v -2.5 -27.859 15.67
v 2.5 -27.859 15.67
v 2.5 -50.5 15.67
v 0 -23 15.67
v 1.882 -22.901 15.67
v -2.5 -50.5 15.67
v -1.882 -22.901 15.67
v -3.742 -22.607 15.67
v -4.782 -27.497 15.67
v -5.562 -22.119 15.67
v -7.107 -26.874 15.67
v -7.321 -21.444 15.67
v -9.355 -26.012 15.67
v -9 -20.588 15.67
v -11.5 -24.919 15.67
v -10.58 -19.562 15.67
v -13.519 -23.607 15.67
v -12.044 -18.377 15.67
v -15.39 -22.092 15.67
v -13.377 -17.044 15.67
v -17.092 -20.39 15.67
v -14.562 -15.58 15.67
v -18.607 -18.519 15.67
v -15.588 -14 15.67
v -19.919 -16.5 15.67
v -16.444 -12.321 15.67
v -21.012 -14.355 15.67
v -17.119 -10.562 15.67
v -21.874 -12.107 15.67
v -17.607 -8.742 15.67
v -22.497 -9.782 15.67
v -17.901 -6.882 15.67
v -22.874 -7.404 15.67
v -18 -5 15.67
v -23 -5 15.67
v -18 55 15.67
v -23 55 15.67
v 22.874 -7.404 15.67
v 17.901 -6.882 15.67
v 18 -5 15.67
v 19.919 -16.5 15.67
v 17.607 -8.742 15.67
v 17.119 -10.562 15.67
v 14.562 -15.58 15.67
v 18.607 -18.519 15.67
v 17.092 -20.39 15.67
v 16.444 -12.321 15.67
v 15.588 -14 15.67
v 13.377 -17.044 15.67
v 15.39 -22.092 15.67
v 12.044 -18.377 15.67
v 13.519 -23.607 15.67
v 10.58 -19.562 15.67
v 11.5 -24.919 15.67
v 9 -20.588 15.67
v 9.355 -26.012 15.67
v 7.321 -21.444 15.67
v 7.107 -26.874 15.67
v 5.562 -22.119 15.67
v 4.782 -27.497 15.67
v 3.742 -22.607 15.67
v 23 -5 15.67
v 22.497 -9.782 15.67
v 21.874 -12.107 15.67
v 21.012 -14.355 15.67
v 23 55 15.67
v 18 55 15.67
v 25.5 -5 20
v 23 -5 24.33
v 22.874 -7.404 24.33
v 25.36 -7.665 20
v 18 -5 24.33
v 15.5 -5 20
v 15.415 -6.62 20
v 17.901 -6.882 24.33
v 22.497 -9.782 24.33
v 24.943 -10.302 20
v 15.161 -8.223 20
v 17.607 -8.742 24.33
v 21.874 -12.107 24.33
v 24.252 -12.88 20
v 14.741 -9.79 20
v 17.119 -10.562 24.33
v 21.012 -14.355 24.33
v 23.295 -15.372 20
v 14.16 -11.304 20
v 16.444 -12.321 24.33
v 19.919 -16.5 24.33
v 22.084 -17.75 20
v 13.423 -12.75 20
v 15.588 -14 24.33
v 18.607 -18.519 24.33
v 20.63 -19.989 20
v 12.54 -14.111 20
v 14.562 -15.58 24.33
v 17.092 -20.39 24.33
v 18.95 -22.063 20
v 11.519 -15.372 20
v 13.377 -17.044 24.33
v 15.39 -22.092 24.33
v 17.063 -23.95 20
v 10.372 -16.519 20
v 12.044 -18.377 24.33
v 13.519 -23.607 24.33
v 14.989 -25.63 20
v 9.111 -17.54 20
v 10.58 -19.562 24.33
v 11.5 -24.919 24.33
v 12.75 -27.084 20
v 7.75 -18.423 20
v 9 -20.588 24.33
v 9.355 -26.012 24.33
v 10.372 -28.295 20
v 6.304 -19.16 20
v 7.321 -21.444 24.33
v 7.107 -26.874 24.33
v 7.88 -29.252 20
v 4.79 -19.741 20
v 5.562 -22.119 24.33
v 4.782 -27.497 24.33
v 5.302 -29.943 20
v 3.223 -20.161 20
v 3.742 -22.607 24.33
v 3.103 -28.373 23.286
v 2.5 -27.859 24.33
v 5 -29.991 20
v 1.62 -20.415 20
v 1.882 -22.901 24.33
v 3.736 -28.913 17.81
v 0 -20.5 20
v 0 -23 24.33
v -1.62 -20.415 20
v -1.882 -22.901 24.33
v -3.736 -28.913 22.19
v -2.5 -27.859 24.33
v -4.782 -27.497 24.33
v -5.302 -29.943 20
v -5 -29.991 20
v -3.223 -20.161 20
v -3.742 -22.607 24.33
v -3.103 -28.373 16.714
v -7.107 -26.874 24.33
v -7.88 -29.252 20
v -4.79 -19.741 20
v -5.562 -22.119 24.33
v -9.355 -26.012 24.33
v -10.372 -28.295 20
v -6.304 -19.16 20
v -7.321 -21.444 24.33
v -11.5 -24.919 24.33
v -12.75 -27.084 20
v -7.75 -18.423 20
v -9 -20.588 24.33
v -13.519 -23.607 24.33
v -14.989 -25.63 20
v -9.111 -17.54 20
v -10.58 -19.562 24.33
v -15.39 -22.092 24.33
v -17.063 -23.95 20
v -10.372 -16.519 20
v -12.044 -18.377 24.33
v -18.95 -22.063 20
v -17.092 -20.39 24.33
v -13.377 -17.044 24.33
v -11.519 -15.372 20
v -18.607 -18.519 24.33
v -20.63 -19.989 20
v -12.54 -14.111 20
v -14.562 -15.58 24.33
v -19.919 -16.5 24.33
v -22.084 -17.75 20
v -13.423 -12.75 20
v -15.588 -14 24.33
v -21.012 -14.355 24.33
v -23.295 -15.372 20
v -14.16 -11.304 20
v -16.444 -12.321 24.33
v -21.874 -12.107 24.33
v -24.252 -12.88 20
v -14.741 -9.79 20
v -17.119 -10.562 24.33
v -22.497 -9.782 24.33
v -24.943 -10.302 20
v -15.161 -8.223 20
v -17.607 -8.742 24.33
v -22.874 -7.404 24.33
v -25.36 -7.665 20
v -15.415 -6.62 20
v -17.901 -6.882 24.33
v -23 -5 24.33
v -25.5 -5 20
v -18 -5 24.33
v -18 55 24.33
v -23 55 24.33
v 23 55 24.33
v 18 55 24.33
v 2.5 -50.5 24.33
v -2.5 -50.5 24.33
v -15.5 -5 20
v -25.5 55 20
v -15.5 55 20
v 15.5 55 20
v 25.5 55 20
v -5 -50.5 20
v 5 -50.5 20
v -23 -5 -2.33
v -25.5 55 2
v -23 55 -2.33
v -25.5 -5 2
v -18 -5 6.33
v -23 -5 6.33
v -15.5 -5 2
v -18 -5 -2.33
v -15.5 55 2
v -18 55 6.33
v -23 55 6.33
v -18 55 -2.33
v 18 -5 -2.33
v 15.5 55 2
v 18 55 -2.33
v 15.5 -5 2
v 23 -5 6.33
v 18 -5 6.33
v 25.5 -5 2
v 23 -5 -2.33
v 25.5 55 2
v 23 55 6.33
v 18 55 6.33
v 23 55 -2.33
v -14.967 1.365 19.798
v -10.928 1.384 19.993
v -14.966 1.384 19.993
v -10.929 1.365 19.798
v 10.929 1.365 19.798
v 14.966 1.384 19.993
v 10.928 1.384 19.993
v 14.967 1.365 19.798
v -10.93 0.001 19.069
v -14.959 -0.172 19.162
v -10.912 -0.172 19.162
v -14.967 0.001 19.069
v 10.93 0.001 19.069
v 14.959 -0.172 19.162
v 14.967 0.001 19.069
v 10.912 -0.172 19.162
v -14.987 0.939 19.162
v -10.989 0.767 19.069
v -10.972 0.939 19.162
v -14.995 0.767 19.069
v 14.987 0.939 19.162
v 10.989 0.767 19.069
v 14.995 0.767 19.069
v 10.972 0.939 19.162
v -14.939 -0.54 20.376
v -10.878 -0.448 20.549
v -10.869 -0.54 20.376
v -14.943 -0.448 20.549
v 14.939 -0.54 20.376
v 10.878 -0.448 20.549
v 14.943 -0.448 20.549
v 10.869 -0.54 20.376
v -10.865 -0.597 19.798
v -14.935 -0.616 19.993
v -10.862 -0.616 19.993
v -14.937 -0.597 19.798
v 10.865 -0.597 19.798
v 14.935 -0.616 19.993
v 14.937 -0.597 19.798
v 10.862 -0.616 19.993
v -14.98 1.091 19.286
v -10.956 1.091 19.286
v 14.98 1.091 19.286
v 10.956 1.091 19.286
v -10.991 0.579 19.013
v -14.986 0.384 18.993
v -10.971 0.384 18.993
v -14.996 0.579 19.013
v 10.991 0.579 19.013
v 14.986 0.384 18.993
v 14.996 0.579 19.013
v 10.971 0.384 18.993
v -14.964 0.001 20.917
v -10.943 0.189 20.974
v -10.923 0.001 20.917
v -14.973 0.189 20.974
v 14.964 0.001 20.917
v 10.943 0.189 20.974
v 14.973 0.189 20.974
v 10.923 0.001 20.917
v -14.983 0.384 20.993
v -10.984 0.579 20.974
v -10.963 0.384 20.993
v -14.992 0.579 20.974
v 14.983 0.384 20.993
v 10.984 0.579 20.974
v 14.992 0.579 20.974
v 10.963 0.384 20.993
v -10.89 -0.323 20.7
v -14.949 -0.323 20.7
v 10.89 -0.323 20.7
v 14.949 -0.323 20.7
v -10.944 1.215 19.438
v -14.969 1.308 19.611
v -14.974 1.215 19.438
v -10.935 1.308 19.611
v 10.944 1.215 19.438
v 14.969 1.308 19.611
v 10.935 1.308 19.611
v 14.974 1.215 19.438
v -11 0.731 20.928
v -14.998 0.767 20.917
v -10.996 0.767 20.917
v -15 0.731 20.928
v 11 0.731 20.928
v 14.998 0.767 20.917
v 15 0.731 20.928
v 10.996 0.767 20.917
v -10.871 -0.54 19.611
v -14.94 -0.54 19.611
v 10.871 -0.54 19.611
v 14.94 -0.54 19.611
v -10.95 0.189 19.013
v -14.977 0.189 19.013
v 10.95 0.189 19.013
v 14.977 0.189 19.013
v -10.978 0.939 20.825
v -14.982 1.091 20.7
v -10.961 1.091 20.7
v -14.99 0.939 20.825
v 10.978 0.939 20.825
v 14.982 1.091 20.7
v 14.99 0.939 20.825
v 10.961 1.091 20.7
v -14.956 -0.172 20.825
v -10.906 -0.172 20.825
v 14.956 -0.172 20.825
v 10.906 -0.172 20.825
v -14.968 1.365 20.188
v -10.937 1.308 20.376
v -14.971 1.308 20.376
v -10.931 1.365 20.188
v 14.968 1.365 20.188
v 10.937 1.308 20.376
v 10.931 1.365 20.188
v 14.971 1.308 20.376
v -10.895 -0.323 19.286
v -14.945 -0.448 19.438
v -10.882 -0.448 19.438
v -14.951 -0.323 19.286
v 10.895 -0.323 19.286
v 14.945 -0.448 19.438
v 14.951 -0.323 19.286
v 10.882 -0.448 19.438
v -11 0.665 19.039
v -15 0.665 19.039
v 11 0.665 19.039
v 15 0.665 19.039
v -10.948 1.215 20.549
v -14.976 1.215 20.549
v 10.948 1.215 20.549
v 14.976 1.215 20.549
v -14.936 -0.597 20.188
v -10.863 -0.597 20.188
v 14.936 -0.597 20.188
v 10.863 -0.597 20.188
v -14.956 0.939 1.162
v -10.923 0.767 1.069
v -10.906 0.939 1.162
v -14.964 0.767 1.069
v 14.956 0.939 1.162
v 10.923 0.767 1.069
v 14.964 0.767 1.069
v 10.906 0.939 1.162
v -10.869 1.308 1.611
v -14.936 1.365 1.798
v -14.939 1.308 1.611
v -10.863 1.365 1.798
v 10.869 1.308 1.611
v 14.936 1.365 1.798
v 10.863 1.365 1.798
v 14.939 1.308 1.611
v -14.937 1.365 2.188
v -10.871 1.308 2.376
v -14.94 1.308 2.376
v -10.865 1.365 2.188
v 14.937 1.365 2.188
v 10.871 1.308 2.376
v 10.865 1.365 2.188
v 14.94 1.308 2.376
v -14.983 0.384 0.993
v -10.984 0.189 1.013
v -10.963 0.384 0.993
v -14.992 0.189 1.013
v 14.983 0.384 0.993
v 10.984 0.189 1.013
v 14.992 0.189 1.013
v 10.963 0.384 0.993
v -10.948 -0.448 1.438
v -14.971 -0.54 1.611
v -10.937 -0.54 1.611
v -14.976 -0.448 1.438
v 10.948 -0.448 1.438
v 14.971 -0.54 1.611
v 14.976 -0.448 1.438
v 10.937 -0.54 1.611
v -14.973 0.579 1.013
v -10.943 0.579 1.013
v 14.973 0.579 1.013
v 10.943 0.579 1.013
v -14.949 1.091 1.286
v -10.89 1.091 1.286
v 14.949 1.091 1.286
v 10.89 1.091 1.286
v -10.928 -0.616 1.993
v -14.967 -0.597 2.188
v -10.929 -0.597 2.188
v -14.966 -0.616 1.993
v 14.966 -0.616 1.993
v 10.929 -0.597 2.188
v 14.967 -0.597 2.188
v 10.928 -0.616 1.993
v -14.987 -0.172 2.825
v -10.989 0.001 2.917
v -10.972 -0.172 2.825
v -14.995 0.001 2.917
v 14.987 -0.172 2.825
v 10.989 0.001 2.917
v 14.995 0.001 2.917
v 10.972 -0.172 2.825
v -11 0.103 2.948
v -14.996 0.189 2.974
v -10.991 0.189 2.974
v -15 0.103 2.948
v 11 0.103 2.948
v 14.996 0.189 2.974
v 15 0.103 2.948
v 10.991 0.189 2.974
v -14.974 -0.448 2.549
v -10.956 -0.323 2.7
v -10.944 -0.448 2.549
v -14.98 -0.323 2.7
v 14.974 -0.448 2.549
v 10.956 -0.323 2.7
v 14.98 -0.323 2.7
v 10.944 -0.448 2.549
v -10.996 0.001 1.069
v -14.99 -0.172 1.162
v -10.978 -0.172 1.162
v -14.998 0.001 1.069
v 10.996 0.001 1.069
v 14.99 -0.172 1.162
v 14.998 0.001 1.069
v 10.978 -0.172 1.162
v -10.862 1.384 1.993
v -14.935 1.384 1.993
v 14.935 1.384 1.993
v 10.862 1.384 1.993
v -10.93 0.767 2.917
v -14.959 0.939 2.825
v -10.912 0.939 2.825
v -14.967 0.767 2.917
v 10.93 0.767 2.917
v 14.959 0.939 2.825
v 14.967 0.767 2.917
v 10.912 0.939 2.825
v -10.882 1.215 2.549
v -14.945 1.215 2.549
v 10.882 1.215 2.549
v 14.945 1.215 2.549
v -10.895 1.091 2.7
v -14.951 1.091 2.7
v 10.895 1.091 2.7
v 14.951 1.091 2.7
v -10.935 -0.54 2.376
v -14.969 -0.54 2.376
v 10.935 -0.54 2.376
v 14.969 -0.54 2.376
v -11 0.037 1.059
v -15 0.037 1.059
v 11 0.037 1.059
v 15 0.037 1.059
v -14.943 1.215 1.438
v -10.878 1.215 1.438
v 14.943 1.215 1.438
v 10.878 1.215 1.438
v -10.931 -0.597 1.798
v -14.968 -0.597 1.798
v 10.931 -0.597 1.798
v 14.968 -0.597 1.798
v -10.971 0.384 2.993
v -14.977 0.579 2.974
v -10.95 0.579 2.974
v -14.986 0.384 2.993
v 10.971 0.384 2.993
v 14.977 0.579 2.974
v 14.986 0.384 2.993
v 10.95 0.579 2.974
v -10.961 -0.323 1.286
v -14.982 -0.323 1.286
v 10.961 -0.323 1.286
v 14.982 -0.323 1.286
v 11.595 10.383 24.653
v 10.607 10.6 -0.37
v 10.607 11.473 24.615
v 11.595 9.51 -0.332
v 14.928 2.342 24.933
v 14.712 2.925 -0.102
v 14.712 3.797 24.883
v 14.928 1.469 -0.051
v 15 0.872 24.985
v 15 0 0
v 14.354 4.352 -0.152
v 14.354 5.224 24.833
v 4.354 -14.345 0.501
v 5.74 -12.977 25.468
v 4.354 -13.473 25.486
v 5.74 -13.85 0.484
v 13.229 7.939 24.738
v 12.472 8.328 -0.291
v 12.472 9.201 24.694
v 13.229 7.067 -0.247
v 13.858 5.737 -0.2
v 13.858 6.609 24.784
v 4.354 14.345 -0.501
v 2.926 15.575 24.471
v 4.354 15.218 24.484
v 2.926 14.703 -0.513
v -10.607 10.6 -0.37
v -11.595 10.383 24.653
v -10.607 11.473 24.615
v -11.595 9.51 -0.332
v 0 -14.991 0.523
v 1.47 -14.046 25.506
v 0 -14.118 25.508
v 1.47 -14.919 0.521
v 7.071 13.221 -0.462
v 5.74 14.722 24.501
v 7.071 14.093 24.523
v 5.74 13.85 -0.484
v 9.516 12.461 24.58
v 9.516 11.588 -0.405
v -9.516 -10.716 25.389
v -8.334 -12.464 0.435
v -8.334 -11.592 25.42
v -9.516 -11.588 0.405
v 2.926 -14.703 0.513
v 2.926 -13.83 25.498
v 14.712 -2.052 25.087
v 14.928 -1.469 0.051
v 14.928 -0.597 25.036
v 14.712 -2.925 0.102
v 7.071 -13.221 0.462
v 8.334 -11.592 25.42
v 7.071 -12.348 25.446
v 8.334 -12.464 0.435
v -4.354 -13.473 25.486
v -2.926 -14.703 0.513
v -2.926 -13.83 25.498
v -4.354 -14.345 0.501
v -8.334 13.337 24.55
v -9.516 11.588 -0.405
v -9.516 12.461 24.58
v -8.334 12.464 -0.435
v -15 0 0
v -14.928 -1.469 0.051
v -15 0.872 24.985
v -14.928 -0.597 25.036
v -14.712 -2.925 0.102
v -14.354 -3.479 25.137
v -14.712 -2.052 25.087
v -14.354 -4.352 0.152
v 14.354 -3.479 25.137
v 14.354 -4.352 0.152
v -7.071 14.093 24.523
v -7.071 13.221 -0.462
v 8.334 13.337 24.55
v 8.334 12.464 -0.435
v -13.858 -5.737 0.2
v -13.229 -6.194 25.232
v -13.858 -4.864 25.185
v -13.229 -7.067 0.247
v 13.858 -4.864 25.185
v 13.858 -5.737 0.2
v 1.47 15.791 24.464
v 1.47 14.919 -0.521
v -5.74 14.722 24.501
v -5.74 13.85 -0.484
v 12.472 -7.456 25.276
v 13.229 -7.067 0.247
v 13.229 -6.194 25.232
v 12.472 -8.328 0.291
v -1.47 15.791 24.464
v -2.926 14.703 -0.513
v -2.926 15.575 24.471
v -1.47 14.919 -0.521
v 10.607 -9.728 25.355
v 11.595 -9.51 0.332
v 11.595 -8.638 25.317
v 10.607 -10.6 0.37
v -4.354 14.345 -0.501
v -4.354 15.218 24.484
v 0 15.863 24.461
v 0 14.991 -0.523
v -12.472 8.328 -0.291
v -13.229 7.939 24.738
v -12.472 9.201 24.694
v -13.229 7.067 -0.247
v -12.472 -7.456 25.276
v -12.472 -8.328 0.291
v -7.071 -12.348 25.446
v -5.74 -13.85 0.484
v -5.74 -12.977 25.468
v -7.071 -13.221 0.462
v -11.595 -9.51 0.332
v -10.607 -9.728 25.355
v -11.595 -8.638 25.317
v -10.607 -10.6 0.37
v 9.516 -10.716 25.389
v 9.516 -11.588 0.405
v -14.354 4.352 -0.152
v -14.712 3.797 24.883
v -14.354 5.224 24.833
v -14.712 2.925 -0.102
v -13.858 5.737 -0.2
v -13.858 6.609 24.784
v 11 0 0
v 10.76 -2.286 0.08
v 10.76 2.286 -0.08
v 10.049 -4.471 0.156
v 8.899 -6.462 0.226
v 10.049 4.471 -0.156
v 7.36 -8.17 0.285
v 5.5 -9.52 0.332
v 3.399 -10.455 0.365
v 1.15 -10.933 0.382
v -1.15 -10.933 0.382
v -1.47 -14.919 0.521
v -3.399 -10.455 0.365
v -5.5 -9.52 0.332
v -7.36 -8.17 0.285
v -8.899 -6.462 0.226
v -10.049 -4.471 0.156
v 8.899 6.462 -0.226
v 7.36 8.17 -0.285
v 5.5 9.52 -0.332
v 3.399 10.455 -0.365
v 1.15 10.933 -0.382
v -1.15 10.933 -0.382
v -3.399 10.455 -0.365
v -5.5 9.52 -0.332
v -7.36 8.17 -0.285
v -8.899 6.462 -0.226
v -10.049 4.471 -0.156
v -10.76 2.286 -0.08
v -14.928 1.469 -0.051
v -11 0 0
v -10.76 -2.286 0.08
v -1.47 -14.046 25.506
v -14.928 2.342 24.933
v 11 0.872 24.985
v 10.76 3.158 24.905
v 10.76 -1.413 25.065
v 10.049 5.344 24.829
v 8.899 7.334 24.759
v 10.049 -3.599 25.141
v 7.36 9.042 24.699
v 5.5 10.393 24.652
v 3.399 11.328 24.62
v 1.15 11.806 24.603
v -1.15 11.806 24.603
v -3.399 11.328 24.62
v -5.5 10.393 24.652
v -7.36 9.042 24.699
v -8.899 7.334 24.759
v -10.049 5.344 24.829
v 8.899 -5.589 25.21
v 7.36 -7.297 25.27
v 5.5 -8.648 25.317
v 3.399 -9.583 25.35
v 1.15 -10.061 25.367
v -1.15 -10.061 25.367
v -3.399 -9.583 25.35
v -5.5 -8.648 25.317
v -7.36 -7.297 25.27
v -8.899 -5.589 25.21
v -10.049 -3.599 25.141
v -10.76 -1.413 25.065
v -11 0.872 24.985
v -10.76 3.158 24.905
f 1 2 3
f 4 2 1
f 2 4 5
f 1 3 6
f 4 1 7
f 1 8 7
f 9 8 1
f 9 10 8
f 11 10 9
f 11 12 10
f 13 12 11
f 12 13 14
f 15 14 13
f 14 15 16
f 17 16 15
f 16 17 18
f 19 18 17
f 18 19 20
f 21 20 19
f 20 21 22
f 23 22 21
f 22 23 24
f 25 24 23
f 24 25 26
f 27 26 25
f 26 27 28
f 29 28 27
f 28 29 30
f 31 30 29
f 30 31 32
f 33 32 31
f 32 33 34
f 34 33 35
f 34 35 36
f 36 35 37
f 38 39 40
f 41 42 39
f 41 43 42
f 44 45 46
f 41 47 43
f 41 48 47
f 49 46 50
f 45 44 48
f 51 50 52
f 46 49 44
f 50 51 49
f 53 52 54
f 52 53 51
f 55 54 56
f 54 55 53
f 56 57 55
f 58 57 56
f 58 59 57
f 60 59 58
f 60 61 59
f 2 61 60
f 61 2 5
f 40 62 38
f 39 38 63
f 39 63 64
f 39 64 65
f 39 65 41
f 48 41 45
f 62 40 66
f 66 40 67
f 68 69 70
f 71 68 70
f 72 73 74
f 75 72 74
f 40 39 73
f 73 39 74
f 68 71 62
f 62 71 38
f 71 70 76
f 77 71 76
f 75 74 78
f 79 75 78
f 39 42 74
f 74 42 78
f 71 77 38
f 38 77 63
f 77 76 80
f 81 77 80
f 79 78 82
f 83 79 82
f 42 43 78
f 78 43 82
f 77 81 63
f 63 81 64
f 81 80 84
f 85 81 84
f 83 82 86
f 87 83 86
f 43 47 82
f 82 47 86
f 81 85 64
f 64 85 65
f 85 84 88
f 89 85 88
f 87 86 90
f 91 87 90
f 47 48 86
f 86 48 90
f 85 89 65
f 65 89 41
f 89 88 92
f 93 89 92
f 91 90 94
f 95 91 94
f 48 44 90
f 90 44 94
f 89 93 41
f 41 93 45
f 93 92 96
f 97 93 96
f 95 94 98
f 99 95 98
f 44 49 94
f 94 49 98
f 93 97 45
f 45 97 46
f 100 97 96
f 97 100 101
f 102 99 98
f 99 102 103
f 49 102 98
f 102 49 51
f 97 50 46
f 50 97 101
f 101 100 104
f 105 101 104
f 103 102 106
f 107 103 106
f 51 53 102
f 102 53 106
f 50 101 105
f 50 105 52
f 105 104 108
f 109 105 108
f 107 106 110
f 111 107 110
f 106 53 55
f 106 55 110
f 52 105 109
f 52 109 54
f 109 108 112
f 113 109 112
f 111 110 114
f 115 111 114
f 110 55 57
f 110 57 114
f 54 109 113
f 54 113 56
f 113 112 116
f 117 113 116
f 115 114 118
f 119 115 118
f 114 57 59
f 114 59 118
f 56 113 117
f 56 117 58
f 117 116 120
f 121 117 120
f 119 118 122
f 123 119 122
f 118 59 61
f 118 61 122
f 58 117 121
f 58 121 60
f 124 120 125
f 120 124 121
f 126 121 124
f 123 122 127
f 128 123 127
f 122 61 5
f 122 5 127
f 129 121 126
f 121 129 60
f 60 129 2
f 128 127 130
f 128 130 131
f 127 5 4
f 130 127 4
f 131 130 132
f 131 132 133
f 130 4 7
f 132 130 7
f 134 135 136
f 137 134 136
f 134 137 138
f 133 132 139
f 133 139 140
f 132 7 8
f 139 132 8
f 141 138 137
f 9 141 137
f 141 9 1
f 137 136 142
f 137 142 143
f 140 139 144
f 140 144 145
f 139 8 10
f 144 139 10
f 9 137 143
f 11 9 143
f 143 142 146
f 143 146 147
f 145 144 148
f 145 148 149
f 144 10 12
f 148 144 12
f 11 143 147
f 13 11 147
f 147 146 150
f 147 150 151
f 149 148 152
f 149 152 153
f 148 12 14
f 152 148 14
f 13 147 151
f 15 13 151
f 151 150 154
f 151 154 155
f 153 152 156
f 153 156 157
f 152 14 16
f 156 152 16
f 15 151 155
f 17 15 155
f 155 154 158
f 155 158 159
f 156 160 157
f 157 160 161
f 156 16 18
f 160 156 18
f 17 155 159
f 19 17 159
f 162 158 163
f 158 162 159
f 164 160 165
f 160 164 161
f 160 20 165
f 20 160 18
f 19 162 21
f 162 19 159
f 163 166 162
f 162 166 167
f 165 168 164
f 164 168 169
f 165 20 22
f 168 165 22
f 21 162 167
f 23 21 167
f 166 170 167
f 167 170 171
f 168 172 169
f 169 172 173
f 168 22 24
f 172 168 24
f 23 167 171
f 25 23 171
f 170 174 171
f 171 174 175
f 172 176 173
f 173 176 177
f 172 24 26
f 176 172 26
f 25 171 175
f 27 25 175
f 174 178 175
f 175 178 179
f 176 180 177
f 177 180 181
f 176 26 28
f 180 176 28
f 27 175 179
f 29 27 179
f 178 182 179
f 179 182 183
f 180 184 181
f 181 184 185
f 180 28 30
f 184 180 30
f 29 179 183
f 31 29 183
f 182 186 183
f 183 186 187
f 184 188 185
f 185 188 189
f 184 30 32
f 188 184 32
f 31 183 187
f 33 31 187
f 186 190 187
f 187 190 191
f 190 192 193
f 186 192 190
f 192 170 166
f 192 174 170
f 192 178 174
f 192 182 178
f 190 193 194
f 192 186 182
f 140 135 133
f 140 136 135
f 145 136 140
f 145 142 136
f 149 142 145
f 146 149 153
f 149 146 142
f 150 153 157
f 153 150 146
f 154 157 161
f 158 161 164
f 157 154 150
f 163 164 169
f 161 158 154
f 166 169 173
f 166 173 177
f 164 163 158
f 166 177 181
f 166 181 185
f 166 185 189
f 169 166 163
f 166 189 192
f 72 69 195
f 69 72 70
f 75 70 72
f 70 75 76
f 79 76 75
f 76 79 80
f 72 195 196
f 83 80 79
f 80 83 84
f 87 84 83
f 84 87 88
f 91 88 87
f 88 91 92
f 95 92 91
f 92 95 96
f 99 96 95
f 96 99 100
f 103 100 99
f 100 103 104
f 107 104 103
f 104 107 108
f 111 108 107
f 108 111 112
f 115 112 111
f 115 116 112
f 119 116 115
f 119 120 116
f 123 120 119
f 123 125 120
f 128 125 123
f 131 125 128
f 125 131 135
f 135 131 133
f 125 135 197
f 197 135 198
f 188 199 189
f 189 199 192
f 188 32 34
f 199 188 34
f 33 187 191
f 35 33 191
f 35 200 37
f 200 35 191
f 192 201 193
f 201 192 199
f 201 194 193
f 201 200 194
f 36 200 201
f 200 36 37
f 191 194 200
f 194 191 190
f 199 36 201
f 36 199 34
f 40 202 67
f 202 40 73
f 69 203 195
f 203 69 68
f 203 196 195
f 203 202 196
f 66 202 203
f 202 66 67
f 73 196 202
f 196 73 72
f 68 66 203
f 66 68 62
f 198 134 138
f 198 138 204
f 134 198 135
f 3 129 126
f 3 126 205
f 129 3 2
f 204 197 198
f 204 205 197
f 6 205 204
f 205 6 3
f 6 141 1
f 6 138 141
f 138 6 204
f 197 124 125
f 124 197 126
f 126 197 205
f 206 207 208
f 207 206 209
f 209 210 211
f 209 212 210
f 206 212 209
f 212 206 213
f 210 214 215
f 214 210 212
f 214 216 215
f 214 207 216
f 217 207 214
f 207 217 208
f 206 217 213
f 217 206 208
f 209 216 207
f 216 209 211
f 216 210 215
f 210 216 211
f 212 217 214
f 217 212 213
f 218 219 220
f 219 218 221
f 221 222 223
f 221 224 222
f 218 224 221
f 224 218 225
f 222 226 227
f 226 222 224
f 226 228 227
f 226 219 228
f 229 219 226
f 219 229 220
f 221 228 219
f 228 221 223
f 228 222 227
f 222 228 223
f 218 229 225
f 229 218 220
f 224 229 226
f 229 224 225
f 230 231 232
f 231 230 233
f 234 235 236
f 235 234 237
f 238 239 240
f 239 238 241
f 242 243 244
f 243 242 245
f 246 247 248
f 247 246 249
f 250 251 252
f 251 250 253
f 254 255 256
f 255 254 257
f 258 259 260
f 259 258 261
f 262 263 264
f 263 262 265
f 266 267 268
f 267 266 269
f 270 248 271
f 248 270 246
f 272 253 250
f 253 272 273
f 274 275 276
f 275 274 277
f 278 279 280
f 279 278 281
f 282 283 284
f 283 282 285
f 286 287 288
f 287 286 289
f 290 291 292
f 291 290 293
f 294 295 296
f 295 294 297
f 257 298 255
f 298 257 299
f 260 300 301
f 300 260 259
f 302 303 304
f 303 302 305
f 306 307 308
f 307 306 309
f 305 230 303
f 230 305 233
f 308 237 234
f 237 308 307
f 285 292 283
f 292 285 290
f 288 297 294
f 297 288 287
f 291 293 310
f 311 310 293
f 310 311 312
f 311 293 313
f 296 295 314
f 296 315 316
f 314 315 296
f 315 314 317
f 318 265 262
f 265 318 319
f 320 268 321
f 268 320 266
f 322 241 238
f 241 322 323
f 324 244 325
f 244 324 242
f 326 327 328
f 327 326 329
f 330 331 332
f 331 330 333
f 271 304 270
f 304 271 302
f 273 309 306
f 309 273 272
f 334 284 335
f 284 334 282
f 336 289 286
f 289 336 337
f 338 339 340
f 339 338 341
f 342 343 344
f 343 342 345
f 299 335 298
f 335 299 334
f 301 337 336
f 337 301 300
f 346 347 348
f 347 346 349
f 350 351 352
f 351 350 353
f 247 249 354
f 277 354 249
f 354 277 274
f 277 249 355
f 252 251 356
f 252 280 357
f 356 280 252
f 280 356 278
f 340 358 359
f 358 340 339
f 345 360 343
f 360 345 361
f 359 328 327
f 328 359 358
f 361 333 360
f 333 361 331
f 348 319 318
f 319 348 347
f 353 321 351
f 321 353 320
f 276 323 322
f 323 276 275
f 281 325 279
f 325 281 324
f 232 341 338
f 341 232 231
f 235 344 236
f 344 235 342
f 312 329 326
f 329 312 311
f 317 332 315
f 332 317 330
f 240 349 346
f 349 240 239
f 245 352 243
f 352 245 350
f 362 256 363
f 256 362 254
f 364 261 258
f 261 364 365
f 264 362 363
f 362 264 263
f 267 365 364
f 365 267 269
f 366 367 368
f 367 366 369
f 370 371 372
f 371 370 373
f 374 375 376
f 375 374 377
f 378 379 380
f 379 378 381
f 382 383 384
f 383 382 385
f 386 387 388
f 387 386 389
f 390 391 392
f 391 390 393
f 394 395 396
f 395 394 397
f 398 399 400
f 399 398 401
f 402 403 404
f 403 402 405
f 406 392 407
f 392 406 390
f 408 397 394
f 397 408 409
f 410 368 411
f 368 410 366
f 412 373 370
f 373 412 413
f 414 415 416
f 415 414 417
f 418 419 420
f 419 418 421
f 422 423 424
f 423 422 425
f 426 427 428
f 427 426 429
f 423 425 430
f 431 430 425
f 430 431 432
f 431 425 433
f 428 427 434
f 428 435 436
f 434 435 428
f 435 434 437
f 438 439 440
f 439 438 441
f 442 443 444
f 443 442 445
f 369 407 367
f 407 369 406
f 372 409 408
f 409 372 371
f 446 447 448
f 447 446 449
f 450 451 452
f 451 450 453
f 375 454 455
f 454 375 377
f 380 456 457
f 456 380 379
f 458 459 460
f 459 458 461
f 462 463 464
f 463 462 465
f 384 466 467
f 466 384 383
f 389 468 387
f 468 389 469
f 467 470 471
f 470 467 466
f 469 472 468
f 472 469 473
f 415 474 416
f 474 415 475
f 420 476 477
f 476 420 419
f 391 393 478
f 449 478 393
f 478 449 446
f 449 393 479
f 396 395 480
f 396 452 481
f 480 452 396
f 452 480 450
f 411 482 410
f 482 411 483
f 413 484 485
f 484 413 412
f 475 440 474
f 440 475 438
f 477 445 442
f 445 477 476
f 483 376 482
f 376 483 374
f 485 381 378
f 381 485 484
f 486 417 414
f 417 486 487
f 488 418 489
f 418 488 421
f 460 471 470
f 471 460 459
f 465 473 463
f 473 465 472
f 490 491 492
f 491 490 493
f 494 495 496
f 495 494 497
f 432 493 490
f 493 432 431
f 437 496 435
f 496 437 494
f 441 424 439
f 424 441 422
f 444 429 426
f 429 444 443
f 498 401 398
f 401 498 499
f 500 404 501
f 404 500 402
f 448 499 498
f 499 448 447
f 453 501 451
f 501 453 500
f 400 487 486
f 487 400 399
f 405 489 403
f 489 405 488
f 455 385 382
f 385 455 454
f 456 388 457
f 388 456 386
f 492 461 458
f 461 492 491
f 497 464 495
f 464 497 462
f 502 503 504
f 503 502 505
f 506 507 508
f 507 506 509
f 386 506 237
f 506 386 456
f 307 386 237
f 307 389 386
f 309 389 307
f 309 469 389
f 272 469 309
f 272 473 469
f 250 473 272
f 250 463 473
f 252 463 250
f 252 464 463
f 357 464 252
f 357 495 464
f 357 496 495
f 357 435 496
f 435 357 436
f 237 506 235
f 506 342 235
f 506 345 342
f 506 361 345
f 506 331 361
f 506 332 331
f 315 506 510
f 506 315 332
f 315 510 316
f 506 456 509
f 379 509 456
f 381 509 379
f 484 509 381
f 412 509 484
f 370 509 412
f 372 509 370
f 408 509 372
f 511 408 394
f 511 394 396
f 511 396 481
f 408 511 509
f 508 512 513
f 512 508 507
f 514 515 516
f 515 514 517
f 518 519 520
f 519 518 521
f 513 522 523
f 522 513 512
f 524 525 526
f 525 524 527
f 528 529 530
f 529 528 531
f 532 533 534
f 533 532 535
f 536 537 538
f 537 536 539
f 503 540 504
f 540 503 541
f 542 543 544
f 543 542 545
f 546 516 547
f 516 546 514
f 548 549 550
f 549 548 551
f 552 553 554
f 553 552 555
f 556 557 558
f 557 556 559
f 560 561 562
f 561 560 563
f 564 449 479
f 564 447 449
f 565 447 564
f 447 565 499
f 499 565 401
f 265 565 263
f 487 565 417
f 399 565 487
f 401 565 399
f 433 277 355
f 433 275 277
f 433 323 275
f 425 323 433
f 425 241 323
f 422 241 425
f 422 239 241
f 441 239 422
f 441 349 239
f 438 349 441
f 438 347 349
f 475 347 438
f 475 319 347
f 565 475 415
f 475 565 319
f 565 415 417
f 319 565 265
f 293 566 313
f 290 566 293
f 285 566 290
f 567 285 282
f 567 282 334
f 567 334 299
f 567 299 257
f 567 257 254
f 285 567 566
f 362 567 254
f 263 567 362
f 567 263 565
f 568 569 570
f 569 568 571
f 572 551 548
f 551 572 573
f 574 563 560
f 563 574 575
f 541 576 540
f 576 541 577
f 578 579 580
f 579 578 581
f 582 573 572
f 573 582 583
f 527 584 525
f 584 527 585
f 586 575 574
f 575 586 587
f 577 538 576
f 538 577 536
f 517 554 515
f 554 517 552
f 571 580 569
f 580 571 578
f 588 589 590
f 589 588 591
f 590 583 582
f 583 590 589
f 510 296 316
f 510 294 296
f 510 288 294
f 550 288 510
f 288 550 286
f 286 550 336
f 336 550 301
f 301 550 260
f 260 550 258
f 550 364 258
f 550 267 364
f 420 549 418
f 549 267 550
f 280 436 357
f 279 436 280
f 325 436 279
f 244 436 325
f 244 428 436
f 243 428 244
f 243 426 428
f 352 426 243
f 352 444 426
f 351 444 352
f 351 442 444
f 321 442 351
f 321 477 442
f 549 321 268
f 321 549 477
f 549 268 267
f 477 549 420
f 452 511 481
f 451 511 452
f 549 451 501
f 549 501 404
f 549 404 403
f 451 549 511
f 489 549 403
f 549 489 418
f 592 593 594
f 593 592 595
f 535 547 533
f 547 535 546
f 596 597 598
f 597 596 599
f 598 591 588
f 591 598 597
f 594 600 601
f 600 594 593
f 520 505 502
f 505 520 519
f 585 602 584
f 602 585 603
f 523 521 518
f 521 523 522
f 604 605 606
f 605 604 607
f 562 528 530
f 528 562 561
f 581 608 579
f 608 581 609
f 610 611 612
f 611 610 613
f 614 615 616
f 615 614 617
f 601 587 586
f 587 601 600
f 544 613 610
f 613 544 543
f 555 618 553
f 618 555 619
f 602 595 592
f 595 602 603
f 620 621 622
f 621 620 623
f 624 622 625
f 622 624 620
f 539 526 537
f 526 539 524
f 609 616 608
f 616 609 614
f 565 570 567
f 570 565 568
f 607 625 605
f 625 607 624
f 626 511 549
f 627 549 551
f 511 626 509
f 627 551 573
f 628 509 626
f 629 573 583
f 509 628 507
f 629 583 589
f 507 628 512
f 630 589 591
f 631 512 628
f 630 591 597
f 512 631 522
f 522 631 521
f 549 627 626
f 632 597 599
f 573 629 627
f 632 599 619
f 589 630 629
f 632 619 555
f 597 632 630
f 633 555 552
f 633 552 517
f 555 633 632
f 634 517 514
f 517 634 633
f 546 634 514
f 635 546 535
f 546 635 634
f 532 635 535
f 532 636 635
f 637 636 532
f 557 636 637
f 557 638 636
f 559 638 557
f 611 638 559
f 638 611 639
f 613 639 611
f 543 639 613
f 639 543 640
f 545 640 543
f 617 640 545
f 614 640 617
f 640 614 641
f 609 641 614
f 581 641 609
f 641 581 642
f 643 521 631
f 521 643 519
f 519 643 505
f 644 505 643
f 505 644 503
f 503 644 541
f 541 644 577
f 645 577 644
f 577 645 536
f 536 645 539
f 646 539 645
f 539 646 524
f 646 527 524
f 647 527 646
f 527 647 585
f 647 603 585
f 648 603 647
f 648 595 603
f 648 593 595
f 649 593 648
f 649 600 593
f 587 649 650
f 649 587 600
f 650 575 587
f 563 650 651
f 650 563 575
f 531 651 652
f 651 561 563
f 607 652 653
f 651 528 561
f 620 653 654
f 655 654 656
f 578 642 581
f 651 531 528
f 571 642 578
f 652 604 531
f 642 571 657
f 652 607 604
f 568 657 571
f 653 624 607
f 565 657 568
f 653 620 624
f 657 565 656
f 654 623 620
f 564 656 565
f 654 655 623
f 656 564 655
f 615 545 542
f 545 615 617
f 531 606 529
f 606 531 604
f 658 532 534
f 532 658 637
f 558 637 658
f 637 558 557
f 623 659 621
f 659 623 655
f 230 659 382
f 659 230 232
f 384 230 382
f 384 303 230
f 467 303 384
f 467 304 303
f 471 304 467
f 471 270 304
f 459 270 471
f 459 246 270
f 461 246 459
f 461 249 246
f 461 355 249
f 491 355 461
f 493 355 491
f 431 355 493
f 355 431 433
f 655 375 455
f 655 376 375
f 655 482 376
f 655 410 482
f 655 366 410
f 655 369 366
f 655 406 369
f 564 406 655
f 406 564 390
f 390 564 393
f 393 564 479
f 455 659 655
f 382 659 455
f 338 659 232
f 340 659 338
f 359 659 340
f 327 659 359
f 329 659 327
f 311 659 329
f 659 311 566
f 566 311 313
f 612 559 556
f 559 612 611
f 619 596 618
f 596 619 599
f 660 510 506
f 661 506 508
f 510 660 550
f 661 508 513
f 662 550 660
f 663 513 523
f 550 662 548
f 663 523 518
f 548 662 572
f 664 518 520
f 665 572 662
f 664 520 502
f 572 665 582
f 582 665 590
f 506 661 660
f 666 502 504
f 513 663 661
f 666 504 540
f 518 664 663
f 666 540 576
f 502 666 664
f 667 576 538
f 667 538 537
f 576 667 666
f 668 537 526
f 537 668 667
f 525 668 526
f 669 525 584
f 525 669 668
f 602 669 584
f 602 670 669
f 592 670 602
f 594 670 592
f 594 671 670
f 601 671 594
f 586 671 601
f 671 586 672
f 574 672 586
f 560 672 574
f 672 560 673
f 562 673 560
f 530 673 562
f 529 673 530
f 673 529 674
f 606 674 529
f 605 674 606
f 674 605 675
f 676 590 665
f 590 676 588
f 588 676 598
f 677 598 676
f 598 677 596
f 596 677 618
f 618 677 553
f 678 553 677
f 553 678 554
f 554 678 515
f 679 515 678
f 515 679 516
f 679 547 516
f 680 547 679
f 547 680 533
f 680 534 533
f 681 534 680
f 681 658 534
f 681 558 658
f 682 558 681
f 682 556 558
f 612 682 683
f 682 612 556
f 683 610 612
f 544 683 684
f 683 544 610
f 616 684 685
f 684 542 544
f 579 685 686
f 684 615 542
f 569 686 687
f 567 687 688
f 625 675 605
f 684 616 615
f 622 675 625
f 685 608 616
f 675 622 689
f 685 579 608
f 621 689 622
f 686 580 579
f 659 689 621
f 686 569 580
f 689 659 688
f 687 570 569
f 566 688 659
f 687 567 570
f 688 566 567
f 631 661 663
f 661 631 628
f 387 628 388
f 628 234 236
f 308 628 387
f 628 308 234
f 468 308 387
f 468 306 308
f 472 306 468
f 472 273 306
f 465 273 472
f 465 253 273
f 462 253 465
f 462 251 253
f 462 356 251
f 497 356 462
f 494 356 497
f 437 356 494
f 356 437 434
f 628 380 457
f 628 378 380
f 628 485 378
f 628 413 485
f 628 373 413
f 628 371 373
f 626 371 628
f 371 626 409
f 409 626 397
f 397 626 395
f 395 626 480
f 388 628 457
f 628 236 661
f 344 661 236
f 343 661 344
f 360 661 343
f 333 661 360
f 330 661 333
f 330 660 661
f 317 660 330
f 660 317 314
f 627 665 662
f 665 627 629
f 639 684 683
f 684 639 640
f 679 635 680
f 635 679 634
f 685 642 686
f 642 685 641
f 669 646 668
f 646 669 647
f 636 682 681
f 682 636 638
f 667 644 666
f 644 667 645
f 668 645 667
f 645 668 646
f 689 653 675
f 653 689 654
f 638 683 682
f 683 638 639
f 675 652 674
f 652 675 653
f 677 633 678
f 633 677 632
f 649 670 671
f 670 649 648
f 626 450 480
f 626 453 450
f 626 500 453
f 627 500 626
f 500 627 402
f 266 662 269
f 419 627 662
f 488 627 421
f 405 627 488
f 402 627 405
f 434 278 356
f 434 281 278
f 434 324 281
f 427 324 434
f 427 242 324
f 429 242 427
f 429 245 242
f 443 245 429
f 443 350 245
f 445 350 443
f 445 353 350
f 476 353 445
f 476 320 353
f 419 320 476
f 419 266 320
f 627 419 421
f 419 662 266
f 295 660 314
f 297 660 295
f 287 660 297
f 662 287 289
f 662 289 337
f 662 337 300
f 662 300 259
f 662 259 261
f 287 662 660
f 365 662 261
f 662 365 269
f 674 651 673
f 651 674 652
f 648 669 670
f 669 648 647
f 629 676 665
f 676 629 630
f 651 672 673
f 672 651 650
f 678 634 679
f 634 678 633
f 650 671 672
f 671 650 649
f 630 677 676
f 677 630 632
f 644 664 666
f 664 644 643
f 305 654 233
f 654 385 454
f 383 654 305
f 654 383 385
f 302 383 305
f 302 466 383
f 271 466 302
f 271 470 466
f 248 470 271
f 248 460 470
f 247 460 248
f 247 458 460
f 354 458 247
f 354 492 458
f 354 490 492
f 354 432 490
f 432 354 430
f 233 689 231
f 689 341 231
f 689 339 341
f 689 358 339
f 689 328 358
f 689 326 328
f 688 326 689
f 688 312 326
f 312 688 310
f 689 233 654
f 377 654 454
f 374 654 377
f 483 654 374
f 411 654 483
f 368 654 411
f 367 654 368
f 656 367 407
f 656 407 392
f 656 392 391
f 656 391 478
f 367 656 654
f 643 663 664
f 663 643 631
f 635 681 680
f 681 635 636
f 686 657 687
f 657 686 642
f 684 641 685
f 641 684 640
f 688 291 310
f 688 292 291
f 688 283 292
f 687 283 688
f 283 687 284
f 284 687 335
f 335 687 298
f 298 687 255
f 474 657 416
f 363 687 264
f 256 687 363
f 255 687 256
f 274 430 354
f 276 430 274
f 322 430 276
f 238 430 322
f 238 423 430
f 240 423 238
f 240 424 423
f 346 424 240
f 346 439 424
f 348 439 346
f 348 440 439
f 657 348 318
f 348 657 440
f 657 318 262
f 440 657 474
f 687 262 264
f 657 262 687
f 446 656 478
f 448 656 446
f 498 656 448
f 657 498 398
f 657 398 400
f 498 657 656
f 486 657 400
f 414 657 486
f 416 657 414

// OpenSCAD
// file: leverMounting.scad
use <presser.scad>
use <leverArms.scad>

mountingDistance = 18;
mountingBottomHoleCenter = 2;
function mountingHoles_getBottomPosition() = [0,0,mountingBottomHoleCenter];
function mountingHoles_getTopPosition() = [0,0,mountingBottomHoleCenter + mountingDistance];
presserR = presser_getR();
holeR = 1;


module mountingHoles(ang = 0)
{
    translate([0,0,mountingDistance/2 + mountingBottomHoleCenter]) rotate([ang,0,0])    union()
    {
        #translate([-presserR - 15, 0, mountingDistance / 2]) rotate([0, 90, 0]) cylinder(h = 2 * presserR + 30, r = holeR, $fn =32);
        #translate([-presserR - 15, 0, -mountingDistance / 2]) rotate([0, 90, 0]) cylinder(h = 2 * presserR + 30, r = holeR, $fn =32);
    }
    
}
mountingHoles();
// file: presser.scad
use <leverMounting.scad>


radious = 15;
thickness = 4;
height = 25;

function presser_getR() = radious;
function getPresserAng() = 2;

presser();
module presser()
{
    difference()
    {
        cylinder(h = height, r = radious, $fn =64);
        translate([0,0,-1])cylinder(h = height + 2, r = radious - thickness);
        
        mountingHoles(getPresserAng());
    }
    
}
// file: leverArms.scad
use <presser.scad>

armsLen = 60;
distanceR = presser_getR() + 0.5;
profileR = 5;

function leverArms_getProfileR() =  profileR;
function leverArms_getDistanceR() = distanceR;



module leverArms_profile()
{
    circle(r = profileR, $fn = 6);
}

module leverArms()
{
    union()
    {
        translate([-(distanceR + profileR), 0, 0]) rotate([-90,0,0])  linear_extrude(    armsLen) leverArms_profile();
        translate([+(distanceR + profileR), 0, 0]) rotate([-90,0,0])  linear_extrude(    armsLen) leverArms_profile();
    }
}
leverArms();
// file: handle.scad
use <leverArms.scad>

armFinishLen = 25;
profileR = leverArms_getProfileR();
distanceR = leverArms_getDistanceR();



module handle()
{
    module U_helper()
    {
        E = distanceR + 2 * profileR;
        translate([-E,0,-profileR]) cube([2 * E, E, 2 * profileR]);
    }

    module U_shape()
    {
        difference()
        {
            rotate_extrude(convexity = 10, $fn = 60)
            translate([distanceR + profileR, 0, 0])
            leverArms_profile();
            U_helper();
        }
    }

    union()
    {
        U_shape();
        translate([0, -(distanceR + profileR), 0]) rotate([90,0,0])  linear_extrude( armFinishLen) circle(r = profileR, $fn = 6);
        leverArms();
    }
}
handle();
// main file
use <handle.scad>
use <leverArms.scad>
use <presser.scad>
use <leverMounting.scad>


translate ([0, -5, 0])
union()
{
    translate (mountingHoles_getTopPosition()) handle();
    translate (mountingHoles_getBottomPosition()) leverArms();
}
rotate([-getPresserAng(), 0, 0]) presser();
